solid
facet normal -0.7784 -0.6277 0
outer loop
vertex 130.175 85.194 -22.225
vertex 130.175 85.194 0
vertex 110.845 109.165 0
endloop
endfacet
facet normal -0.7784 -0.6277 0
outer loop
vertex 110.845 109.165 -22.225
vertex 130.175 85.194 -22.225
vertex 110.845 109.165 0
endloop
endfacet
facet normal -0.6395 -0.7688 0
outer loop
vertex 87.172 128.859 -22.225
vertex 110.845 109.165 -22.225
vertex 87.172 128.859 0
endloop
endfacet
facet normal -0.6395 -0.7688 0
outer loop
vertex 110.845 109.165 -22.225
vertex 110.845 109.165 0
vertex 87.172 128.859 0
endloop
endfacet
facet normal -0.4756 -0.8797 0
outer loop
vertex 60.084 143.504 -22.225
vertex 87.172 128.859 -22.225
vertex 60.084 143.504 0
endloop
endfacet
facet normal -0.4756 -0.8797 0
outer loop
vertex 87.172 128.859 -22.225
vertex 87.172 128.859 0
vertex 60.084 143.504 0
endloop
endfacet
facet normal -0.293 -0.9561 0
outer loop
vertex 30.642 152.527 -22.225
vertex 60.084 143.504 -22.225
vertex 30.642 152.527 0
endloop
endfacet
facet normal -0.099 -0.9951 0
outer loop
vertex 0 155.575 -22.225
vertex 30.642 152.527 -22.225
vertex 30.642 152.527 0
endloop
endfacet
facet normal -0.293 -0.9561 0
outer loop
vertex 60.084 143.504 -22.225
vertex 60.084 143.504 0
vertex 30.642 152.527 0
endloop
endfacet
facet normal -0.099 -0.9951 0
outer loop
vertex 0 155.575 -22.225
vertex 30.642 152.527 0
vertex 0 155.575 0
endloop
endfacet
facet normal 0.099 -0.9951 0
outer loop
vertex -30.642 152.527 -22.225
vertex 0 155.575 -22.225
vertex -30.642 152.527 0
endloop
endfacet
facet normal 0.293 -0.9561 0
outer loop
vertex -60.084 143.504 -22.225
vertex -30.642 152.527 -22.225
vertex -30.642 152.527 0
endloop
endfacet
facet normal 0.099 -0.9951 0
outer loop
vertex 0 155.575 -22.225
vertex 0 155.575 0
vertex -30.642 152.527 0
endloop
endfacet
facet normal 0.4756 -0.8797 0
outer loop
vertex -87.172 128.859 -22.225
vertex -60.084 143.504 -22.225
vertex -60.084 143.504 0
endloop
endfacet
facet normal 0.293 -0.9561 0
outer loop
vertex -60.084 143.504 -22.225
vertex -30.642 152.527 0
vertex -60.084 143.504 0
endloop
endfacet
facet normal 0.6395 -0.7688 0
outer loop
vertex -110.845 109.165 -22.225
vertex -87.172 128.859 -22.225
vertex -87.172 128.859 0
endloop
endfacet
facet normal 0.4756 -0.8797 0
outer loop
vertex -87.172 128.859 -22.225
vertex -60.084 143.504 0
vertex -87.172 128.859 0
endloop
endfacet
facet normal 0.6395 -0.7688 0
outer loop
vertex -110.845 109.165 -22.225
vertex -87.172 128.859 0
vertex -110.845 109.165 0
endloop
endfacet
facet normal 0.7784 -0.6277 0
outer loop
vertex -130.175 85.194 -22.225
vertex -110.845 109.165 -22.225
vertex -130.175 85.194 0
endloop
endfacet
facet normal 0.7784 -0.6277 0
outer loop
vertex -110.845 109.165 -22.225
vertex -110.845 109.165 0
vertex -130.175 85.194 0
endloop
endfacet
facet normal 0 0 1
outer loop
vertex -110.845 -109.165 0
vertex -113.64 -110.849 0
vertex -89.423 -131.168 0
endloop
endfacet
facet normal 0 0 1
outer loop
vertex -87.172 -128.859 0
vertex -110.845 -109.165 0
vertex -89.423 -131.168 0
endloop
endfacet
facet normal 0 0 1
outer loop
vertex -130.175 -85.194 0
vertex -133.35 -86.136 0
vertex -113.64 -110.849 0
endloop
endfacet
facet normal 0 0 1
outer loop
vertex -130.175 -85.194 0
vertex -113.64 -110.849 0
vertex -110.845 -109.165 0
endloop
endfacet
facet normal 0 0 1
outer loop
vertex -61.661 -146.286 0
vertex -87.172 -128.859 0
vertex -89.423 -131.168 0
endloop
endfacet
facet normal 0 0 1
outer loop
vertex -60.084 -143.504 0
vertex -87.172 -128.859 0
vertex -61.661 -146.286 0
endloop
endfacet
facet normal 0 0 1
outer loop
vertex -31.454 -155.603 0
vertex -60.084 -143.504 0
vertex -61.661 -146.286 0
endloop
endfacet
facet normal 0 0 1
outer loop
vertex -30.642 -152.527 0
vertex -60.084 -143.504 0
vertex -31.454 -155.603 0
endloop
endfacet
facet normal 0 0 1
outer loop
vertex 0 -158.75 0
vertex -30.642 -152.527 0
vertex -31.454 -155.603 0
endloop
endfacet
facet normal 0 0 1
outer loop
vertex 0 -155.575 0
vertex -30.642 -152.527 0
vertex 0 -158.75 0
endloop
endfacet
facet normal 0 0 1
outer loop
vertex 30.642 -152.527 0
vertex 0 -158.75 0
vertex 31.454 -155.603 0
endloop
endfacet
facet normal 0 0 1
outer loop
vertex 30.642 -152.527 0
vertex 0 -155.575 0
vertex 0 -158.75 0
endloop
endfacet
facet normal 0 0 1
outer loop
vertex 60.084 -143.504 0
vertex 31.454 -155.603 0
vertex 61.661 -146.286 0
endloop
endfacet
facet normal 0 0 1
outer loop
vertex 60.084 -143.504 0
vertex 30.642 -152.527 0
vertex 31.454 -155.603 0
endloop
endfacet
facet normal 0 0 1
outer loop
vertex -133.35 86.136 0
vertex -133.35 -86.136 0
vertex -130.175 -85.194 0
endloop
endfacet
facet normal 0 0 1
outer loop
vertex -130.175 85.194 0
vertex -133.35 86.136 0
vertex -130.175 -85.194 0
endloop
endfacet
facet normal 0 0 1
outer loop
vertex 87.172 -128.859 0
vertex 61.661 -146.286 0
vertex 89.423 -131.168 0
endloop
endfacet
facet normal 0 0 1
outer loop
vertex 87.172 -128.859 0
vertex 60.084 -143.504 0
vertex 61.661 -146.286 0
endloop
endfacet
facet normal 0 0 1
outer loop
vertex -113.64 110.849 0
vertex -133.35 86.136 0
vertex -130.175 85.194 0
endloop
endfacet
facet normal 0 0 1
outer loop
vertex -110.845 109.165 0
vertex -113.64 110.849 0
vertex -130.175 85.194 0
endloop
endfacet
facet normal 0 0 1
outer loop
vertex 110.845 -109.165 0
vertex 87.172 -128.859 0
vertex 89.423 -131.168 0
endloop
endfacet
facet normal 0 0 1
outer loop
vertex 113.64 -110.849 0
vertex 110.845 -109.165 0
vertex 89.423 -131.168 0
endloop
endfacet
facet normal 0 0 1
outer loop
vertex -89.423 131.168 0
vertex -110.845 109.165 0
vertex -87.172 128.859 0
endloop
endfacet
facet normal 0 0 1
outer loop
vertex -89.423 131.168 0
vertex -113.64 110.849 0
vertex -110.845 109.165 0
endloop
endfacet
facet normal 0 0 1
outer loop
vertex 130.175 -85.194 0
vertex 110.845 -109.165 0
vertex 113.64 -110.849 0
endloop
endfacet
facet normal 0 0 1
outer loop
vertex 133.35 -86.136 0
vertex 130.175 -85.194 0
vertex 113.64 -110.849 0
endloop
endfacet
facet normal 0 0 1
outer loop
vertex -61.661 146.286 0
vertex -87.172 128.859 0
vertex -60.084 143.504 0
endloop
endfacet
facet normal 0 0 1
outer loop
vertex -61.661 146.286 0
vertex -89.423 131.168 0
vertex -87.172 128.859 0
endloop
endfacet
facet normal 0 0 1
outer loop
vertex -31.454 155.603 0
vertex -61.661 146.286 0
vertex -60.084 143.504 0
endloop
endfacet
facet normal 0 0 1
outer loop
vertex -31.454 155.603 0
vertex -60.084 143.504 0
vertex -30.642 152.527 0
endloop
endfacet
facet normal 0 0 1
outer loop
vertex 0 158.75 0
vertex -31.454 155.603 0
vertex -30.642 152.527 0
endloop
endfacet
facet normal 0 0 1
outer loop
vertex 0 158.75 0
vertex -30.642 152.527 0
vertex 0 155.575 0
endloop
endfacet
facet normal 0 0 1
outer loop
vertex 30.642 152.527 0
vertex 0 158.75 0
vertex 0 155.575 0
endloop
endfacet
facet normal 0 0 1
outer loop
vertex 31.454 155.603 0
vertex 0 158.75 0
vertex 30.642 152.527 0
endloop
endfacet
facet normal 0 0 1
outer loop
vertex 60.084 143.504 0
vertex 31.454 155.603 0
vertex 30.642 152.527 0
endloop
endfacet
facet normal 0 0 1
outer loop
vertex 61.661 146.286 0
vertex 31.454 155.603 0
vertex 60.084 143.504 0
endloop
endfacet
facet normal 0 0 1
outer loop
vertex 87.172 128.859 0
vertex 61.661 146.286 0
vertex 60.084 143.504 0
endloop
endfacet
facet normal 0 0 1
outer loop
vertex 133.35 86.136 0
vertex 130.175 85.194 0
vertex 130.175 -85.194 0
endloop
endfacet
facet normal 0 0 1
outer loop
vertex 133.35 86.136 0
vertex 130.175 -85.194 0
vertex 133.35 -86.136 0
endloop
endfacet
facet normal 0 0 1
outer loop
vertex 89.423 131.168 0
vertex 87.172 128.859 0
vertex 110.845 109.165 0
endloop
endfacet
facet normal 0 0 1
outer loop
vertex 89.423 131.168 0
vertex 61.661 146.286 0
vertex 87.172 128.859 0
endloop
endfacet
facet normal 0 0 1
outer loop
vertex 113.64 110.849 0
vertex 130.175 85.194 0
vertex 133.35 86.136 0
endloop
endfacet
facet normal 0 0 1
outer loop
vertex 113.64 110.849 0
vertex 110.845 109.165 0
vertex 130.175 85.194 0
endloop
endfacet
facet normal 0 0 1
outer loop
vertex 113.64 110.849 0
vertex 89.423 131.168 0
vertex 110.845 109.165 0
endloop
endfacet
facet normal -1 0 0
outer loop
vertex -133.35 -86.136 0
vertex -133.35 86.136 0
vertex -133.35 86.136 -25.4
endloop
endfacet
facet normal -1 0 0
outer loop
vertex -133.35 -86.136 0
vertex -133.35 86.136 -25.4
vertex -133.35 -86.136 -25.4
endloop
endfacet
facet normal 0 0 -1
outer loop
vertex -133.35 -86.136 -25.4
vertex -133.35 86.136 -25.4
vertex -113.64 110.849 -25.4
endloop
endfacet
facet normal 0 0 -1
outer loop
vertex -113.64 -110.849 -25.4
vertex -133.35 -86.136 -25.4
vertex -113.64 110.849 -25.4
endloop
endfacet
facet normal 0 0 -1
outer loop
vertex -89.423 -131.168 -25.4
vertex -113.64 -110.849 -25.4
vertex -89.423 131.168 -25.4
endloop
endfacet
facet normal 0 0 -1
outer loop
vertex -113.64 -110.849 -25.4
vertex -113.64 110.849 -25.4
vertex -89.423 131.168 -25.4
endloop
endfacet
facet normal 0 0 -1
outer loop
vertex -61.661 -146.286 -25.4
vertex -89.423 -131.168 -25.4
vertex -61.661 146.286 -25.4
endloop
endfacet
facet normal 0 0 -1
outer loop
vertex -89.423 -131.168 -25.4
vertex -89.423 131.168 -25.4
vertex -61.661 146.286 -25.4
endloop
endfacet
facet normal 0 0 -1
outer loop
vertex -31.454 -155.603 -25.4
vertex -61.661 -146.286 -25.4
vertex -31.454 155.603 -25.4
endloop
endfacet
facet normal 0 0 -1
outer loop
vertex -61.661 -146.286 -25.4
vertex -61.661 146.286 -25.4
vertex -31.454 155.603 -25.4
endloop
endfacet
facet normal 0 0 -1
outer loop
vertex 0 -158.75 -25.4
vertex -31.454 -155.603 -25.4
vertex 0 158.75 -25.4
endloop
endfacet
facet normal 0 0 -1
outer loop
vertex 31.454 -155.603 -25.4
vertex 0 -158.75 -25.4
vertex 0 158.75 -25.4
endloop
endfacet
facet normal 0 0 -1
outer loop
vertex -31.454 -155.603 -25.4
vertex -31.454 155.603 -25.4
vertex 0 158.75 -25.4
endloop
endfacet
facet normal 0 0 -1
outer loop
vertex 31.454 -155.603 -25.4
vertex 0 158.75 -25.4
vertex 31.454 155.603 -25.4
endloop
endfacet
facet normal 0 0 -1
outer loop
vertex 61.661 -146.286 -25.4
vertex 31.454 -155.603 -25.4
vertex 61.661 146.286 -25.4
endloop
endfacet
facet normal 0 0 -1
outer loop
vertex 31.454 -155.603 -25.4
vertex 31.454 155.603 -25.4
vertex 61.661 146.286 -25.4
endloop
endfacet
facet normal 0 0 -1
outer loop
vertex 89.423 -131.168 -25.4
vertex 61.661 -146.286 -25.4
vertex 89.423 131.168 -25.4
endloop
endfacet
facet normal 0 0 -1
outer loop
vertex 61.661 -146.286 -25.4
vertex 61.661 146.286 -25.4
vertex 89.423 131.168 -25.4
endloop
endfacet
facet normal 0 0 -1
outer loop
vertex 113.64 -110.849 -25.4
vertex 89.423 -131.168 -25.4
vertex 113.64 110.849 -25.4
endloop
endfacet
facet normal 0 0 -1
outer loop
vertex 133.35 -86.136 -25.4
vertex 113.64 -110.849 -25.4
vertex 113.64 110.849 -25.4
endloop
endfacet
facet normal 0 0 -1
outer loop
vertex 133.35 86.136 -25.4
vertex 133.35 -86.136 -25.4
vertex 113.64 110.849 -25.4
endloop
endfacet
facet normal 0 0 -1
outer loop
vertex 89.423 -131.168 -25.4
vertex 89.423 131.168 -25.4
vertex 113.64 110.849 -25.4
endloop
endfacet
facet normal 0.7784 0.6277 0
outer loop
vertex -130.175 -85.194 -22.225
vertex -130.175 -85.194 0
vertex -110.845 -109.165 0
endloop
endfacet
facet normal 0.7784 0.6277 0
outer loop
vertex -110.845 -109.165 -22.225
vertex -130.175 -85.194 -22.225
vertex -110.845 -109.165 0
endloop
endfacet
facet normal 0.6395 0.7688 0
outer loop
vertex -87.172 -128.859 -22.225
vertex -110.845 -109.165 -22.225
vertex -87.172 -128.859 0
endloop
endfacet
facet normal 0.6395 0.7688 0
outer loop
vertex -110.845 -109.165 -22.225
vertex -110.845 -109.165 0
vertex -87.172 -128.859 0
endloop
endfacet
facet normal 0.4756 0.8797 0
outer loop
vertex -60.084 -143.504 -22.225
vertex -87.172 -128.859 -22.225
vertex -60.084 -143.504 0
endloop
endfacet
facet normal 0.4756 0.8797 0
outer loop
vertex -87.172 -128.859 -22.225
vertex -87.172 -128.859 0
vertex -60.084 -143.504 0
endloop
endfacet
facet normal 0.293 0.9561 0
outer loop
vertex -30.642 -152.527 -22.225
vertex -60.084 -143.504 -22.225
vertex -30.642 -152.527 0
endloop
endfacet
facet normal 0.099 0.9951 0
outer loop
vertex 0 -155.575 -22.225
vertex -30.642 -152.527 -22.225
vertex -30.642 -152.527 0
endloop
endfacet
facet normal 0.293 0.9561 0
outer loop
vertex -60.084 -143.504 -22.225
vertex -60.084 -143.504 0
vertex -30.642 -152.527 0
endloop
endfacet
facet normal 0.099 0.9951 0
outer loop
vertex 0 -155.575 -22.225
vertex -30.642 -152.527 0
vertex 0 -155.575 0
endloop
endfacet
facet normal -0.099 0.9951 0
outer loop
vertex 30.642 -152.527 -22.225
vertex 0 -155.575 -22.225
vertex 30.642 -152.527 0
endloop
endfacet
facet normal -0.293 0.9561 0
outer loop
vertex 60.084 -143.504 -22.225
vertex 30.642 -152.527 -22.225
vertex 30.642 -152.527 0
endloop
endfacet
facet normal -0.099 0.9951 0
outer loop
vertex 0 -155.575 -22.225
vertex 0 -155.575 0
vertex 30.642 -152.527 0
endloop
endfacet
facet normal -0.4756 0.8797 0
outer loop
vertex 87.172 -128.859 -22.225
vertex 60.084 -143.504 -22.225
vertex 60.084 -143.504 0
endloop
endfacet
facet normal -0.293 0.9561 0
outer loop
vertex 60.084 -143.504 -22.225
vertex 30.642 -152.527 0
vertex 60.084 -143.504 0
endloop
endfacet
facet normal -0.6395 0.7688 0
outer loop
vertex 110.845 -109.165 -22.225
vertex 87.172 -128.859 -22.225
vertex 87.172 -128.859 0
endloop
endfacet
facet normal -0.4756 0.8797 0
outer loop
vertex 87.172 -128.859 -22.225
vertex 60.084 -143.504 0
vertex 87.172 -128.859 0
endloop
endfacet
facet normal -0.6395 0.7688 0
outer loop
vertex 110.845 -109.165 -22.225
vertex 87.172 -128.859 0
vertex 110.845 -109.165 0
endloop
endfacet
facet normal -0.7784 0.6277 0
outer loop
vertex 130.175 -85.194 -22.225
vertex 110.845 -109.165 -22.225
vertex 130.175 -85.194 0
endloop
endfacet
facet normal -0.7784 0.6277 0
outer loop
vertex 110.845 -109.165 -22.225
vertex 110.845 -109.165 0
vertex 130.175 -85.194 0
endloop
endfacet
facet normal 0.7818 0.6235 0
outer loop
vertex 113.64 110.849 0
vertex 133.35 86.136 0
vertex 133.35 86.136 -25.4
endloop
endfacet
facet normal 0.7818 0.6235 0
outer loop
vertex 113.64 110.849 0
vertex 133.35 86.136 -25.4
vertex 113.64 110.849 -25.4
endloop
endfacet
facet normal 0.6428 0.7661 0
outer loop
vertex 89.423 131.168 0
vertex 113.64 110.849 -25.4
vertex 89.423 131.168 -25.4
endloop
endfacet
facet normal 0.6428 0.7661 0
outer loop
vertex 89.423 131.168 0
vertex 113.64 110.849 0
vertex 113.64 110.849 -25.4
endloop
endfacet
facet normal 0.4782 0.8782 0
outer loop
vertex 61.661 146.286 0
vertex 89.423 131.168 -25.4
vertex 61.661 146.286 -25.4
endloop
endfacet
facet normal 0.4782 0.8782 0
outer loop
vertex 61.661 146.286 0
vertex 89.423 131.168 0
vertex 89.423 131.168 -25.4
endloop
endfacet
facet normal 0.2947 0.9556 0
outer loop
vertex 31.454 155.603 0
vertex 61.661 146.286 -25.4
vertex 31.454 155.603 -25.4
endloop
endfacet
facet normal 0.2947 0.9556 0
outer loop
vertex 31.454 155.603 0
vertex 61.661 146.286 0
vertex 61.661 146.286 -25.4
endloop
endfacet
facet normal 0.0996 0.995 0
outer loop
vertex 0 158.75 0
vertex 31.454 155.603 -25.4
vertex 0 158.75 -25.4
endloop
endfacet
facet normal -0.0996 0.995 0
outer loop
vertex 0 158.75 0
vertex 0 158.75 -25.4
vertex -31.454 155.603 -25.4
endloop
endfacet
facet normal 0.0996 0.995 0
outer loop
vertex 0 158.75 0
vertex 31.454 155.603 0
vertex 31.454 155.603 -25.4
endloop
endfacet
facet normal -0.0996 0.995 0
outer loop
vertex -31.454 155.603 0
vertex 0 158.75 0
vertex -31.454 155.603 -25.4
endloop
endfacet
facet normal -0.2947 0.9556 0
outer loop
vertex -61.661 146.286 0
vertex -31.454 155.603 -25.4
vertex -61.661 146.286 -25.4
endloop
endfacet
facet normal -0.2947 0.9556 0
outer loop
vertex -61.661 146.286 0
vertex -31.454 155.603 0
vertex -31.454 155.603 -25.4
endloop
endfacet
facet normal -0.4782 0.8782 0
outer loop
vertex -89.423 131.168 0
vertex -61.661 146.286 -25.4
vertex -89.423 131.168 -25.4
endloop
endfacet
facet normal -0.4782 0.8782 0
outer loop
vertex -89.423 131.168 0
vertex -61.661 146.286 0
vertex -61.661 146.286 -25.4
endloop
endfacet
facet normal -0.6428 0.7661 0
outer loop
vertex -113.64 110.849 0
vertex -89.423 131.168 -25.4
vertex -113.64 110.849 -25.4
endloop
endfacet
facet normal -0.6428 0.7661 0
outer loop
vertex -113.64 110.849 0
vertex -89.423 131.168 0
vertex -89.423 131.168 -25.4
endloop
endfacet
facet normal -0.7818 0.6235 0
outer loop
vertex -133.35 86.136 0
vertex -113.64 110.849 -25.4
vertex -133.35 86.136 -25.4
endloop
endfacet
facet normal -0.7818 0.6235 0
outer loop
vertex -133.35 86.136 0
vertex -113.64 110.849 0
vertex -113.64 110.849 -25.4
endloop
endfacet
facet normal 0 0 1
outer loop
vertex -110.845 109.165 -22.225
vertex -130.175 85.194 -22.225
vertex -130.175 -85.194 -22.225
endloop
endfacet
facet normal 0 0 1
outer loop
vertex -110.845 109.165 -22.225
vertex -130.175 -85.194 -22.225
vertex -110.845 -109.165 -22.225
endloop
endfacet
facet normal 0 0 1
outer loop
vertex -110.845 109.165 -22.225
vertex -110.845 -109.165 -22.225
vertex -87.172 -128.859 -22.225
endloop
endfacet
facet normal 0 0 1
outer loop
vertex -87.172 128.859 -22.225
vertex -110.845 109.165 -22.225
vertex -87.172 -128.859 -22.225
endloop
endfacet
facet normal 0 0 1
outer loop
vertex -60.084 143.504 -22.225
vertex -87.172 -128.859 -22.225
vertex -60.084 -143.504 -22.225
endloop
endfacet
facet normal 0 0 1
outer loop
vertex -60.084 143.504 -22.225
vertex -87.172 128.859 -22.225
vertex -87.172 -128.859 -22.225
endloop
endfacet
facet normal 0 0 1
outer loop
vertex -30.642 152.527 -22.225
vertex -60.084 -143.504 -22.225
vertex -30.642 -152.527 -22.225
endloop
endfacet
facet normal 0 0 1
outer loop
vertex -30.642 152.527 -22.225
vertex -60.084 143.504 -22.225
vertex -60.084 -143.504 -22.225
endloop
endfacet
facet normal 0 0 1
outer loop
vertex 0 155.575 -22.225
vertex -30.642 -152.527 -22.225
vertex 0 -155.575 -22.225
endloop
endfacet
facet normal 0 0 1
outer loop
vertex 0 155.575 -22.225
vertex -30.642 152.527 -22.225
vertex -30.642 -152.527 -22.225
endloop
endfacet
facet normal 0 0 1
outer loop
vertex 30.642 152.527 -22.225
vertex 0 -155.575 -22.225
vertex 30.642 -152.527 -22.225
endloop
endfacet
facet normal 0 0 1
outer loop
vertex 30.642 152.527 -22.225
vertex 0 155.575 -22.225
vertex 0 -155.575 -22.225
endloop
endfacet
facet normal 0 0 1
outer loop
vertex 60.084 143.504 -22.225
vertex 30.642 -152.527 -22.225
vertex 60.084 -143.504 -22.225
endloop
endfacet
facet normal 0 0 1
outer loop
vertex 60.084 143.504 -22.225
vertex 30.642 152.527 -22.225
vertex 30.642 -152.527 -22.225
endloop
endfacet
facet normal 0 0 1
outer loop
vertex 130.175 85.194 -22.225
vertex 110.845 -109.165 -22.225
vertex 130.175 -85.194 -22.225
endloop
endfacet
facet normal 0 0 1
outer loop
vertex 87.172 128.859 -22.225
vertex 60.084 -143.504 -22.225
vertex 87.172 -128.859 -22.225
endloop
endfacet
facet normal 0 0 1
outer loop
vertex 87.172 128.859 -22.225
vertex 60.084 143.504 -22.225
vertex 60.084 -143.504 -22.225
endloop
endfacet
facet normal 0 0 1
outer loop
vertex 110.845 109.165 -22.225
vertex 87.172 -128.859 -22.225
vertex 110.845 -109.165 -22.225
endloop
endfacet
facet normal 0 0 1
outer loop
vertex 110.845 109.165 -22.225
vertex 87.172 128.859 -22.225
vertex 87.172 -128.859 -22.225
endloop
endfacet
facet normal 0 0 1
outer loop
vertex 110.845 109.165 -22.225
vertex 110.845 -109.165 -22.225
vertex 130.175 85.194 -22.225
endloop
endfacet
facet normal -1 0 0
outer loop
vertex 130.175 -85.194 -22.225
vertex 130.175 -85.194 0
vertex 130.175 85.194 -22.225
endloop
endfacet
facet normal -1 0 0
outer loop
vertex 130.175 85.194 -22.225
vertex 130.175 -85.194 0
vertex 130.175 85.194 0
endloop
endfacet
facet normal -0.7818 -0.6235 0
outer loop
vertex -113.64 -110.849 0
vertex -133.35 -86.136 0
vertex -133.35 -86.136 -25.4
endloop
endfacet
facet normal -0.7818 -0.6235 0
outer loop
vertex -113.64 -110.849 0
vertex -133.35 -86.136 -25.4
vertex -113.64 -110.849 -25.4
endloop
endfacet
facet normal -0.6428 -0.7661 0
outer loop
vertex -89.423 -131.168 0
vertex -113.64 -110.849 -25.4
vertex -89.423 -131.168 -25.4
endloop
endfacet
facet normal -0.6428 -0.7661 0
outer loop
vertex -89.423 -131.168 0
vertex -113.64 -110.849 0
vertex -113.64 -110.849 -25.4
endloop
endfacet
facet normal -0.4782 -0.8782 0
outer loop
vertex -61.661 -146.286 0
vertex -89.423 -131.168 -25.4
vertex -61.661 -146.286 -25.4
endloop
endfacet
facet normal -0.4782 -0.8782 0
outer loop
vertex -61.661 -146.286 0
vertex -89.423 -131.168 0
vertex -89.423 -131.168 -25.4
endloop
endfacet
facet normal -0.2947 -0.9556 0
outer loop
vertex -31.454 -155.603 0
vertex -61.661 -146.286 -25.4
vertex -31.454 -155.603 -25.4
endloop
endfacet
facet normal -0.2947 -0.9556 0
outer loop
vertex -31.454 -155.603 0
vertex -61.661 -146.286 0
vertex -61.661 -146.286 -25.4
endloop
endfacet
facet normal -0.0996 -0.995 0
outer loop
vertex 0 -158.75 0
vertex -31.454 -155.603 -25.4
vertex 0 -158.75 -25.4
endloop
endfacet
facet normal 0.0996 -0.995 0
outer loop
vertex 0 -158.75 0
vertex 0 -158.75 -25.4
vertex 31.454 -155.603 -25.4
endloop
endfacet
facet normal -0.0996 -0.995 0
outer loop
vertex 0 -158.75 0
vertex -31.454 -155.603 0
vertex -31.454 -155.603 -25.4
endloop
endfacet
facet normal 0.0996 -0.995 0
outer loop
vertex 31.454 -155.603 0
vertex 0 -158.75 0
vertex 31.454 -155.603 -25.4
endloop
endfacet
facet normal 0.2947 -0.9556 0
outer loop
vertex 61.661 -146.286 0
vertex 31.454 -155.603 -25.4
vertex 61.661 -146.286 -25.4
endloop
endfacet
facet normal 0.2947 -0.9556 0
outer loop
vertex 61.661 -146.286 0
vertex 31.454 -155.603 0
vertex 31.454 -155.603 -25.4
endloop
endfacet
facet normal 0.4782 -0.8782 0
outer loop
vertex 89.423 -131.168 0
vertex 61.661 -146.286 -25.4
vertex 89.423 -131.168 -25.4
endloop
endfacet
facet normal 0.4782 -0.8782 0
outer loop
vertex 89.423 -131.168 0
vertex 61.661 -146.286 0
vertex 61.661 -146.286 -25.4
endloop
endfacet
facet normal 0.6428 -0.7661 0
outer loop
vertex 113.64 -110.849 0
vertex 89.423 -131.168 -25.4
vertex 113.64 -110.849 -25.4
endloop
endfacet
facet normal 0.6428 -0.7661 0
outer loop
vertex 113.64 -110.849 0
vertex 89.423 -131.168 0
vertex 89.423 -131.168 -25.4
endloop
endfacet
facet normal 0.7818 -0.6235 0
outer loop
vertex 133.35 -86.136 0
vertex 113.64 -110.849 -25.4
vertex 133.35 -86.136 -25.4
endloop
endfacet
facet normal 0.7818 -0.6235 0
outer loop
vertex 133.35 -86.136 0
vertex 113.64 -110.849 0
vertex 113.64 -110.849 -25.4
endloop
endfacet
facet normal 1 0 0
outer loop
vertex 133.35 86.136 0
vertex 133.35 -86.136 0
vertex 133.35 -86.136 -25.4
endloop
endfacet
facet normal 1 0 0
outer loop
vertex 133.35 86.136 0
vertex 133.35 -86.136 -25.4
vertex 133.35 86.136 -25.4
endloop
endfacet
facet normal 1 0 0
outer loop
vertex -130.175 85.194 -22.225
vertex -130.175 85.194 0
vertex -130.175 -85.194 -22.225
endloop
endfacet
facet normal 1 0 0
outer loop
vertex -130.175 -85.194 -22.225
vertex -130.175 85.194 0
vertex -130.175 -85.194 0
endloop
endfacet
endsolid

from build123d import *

# Parameters (mm, degrees)
F1_DEPTH = 25.4
F2_T     = -3.175


with BuildPart() as f1:
    # F0 (on Top) → F1 (new body)
    with BuildSketch(Plane.XY):
        with BuildLine():
            Line((-133.35, 86.135591), (-133.35, -86.135591))
            ThreePointArc((-133.35, -86.135591), (0, -158.75), (133.35, -86.135591))
            Line((133.35, -86.135591), (133.35, 86.135591))
            ThreePointArc((133.35, 86.135591), (0, 158.75), (-133.35, 86.135591))
        make_face()
    extrude(amount=-F1_DEPTH)

    # F2
    f2_openings = [f1.faces().sort_by_distance(p)[0] for p in [
        (0, 0, 0),
    ]]
    offset(amount=F2_T, openings=f2_openings)


solid = f1.part
